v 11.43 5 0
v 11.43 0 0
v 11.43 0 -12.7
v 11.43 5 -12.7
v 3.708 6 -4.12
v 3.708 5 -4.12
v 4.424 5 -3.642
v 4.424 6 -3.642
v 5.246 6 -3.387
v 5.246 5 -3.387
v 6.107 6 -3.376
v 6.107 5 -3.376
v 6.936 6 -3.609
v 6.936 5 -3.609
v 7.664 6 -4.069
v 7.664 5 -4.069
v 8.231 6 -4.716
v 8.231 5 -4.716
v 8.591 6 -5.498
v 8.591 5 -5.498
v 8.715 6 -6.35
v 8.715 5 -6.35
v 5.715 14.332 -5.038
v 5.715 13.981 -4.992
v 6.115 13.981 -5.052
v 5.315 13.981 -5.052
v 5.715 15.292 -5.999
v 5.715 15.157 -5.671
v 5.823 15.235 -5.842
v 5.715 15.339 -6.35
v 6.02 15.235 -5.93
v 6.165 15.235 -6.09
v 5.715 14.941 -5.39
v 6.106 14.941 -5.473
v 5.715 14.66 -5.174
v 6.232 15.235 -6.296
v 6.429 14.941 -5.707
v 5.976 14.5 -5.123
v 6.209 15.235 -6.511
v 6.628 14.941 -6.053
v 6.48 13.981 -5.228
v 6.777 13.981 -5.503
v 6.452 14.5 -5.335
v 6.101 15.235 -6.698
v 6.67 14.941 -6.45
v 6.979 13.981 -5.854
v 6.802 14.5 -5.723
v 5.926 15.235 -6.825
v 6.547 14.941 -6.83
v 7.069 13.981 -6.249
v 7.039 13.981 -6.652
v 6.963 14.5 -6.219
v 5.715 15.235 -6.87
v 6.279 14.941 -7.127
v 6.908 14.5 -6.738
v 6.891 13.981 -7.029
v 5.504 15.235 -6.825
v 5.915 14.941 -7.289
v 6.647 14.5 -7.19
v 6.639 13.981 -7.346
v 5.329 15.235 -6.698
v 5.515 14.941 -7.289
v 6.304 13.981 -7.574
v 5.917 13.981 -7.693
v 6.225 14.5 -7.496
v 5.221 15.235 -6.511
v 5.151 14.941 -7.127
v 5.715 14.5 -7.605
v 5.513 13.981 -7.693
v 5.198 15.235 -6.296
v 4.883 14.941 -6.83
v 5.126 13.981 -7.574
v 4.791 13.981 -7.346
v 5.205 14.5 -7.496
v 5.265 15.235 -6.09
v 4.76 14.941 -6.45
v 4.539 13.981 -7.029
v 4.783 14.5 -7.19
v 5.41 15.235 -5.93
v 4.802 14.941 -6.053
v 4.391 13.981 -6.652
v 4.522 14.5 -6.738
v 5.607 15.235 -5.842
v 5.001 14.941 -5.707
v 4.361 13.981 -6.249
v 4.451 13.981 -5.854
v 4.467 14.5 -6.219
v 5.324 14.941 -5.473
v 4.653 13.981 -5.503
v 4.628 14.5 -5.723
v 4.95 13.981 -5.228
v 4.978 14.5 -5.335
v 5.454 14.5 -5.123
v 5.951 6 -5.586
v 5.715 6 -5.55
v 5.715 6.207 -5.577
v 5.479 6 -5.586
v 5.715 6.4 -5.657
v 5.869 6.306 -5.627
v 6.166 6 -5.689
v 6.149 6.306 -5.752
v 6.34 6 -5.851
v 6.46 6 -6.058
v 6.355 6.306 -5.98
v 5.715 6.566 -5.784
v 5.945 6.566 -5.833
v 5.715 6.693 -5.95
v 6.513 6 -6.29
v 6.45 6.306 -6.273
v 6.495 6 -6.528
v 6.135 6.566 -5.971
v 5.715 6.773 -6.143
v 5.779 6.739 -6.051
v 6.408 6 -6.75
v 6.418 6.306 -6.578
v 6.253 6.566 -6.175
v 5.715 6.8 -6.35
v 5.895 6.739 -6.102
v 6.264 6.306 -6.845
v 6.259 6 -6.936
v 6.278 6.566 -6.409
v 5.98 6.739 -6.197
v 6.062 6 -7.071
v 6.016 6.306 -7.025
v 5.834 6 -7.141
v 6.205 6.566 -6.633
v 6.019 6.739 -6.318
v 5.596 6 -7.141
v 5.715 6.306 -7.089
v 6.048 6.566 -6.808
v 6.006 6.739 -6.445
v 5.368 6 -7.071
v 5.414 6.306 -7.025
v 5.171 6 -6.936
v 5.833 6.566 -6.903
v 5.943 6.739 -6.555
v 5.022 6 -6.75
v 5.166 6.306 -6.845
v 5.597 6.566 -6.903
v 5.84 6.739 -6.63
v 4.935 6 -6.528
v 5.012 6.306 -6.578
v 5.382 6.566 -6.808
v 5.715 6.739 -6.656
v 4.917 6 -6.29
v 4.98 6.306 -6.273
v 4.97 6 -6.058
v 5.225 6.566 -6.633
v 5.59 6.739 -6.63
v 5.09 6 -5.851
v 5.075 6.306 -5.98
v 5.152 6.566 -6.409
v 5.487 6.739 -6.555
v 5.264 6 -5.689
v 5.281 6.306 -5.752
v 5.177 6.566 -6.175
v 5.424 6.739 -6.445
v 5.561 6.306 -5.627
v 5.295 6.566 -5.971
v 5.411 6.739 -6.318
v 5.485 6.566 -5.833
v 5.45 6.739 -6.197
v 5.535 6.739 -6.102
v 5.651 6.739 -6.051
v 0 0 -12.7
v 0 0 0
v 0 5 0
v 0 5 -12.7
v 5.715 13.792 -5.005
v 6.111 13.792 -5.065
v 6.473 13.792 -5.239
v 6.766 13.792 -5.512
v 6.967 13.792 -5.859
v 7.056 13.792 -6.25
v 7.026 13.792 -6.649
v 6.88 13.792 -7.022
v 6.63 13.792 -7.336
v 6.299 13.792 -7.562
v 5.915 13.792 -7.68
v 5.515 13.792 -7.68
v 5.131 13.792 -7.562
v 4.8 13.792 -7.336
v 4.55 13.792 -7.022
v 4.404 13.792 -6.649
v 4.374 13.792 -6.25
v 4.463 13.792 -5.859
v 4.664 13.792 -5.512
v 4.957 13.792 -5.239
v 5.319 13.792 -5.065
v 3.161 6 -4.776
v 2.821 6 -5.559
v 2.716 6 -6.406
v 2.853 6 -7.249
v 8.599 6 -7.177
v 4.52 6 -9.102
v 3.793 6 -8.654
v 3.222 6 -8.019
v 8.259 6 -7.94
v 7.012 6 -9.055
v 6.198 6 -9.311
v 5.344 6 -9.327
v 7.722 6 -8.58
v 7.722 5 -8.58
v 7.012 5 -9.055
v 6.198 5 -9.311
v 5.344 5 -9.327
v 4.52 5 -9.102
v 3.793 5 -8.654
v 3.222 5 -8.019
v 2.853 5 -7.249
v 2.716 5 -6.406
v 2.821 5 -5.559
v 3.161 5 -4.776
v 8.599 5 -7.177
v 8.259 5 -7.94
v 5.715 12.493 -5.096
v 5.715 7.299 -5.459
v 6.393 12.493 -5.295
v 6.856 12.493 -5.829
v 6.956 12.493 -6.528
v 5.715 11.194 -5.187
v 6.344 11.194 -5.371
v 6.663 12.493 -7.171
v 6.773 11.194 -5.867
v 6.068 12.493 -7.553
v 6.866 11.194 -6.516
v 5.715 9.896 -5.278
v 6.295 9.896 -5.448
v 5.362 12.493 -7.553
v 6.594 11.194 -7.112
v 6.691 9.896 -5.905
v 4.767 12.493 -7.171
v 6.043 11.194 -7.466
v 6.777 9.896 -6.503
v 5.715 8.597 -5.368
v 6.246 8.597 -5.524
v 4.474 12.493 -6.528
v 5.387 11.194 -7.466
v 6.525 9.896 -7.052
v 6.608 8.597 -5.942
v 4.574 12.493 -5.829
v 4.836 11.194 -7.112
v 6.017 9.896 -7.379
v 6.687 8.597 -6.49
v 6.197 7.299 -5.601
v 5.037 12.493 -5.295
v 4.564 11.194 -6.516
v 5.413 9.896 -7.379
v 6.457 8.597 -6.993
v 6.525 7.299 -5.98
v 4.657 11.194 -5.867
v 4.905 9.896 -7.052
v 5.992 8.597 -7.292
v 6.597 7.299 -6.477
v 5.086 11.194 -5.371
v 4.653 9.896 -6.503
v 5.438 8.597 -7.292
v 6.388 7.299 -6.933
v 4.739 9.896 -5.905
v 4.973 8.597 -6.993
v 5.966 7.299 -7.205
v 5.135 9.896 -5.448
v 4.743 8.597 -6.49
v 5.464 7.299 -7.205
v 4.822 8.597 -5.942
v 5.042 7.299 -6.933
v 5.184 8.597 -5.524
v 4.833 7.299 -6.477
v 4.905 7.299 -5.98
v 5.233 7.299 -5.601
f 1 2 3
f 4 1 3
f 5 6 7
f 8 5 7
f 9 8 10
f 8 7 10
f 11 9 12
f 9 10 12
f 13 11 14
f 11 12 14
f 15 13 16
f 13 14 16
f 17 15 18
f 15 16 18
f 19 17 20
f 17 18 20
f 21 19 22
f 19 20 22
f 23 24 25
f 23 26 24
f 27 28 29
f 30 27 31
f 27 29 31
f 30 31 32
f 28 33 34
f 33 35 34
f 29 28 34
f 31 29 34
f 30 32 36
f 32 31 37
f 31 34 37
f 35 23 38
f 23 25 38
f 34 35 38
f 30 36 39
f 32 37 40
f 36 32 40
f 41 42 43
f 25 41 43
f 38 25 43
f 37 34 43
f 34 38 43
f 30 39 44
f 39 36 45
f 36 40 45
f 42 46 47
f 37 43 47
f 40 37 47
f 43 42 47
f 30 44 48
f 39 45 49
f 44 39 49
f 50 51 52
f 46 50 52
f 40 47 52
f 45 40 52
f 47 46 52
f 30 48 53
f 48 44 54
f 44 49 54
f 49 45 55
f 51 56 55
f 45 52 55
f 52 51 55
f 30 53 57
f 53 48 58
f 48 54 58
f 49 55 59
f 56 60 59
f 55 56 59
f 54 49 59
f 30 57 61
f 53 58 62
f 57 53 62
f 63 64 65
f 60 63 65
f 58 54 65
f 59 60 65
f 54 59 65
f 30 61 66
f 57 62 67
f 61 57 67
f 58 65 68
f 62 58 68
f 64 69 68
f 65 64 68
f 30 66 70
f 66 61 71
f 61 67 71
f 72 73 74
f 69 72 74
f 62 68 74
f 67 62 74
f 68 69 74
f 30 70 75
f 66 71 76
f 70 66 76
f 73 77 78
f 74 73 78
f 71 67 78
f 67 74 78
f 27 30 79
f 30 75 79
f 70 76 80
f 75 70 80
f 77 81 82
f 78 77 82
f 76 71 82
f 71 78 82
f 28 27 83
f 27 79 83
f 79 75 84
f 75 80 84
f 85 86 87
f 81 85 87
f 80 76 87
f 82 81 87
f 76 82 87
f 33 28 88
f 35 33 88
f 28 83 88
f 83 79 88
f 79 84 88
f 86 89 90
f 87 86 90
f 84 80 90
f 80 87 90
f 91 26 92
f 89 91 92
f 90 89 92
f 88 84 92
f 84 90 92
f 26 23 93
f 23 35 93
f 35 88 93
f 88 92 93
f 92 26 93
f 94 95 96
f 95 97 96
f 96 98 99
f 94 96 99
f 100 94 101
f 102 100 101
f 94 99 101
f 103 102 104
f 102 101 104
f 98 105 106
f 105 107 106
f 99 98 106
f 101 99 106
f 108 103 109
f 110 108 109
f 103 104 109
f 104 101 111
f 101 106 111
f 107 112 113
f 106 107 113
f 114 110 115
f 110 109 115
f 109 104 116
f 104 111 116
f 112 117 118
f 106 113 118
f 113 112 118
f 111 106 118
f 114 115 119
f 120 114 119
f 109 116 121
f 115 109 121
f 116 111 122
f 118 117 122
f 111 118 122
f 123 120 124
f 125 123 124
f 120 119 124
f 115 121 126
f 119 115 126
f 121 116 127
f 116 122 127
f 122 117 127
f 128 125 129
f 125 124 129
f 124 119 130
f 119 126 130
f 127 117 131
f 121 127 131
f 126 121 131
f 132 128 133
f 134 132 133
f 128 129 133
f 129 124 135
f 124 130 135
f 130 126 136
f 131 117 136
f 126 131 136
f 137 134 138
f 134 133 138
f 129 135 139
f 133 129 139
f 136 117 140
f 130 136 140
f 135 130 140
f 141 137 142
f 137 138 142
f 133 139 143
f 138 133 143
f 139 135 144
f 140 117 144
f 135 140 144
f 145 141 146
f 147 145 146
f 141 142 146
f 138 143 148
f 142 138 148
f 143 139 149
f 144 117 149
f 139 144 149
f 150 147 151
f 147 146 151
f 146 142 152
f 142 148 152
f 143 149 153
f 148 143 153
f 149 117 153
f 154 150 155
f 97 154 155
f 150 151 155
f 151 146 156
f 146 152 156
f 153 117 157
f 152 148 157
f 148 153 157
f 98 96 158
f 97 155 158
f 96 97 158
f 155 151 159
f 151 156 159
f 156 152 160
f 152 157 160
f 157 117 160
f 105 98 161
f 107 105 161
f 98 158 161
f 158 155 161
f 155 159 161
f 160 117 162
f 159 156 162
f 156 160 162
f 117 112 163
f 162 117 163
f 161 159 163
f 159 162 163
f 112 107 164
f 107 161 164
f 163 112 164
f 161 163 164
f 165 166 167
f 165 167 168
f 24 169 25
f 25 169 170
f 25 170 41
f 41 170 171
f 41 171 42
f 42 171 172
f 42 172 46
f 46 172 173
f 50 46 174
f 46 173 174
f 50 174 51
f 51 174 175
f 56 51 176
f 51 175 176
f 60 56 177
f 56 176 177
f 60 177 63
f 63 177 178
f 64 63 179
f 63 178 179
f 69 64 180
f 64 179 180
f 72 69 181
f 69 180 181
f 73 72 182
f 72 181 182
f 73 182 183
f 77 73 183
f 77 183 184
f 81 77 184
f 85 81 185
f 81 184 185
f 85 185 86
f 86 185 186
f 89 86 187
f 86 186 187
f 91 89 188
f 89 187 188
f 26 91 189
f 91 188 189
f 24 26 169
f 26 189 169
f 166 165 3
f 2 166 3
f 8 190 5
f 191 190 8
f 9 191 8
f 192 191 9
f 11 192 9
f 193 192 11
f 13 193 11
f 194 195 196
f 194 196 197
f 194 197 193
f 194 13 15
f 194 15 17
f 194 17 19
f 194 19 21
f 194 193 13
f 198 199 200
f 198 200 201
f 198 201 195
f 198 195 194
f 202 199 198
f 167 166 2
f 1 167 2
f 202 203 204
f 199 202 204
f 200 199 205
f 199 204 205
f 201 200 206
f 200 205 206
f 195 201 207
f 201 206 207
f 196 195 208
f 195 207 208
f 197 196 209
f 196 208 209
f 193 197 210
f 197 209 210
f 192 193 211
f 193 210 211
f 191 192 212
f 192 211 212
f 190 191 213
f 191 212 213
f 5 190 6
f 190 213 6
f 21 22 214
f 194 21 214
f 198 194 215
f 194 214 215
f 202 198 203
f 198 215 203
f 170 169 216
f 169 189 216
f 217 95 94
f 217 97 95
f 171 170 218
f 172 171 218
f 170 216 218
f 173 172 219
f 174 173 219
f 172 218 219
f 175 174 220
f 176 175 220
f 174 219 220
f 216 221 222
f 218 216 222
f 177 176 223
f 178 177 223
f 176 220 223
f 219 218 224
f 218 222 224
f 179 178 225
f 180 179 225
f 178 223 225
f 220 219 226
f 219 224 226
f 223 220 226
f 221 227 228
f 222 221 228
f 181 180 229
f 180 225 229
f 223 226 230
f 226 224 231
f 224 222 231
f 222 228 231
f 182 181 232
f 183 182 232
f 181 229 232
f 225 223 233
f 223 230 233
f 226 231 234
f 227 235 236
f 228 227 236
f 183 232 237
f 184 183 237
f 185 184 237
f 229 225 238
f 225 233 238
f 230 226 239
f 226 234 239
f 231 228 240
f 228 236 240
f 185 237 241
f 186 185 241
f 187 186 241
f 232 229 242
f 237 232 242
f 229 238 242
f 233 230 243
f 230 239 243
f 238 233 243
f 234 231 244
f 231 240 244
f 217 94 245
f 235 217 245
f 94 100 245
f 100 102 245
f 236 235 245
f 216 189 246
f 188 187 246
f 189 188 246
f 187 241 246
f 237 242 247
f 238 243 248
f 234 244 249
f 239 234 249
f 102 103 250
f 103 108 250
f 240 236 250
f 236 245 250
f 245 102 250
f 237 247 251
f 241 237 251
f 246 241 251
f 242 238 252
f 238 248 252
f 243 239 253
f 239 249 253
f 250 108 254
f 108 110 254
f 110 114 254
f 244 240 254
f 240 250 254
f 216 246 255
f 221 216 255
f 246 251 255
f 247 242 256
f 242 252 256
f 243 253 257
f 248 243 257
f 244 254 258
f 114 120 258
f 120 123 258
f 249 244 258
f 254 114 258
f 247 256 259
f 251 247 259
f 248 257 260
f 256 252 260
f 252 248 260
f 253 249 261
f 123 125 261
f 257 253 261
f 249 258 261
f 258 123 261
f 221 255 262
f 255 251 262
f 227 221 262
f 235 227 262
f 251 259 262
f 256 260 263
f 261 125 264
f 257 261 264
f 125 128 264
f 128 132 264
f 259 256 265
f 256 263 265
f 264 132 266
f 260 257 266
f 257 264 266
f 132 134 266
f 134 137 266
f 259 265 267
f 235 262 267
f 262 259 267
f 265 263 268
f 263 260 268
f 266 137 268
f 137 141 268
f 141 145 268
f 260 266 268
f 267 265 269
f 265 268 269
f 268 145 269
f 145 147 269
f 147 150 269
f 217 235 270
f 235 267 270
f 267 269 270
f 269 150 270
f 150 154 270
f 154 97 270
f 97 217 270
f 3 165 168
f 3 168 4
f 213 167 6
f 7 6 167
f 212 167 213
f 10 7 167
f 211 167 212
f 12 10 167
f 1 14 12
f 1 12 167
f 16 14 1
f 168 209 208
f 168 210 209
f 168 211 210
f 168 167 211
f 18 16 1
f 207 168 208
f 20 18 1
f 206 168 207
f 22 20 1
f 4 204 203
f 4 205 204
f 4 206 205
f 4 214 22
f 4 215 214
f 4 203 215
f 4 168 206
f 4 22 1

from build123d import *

# Parameters (mm, degrees)
SKETCH1_W           = 11.43
SKETCH1_H           = 12.7
BOSS_EXTRUDE1_DEPTH = 5
SKETCH2_R           = 3
BOSS_EXTRUDE4_DEPTH = 1


with BuildPart() as part:
    # Sketch1 → Boss-Extrude1 (new body)
    with BuildSketch(Plane(origin=(0, 0, 0), x_dir=(1, 0, 0), z_dir=(0, 1, 0))):
        with Locations((5.715, 6.35)):
            Rectangle(SKETCH1_W, SKETCH1_H)
    extrude(amount=BOSS_EXTRUDE1_DEPTH)

    # Sketch2 → Boss-Extrude4 (add)
    with BuildSketch(Plane(origin=(0, 5, 0), x_dir=(1, 0, 0), z_dir=(0, 1, 0))):
        with Locations((5.715, 6.35)):
            Circle(SKETCH2_R)
    extrude(amount=BOSS_EXTRUDE4_DEPTH)


with BuildPart() as body_2:
    # Sketch3 → Revolve3 (revolve)
    with BuildSketch(Plane.ZY.offset(-5.715)):
        with BuildLine():
            ThreePointArc((-7.15, 6), (-6.915685425, 6.565685425), (-6.35, 6.8))
            Line((-6.35, 6.8), (-6.35, 15.338564192))
            ThreePointArc((-6.35, 15.338564192), (-7.31028763, 14.940800032), (-7.70805179, 13.980512402))
            Line((-7.70805179, 13.980512402), (-7.15, 6))
        make_face()
    revolve(axis=Axis((5.715, 6, -6.35), (0, 1, 0)))


solid = Compound([part.part, body_2.part])
